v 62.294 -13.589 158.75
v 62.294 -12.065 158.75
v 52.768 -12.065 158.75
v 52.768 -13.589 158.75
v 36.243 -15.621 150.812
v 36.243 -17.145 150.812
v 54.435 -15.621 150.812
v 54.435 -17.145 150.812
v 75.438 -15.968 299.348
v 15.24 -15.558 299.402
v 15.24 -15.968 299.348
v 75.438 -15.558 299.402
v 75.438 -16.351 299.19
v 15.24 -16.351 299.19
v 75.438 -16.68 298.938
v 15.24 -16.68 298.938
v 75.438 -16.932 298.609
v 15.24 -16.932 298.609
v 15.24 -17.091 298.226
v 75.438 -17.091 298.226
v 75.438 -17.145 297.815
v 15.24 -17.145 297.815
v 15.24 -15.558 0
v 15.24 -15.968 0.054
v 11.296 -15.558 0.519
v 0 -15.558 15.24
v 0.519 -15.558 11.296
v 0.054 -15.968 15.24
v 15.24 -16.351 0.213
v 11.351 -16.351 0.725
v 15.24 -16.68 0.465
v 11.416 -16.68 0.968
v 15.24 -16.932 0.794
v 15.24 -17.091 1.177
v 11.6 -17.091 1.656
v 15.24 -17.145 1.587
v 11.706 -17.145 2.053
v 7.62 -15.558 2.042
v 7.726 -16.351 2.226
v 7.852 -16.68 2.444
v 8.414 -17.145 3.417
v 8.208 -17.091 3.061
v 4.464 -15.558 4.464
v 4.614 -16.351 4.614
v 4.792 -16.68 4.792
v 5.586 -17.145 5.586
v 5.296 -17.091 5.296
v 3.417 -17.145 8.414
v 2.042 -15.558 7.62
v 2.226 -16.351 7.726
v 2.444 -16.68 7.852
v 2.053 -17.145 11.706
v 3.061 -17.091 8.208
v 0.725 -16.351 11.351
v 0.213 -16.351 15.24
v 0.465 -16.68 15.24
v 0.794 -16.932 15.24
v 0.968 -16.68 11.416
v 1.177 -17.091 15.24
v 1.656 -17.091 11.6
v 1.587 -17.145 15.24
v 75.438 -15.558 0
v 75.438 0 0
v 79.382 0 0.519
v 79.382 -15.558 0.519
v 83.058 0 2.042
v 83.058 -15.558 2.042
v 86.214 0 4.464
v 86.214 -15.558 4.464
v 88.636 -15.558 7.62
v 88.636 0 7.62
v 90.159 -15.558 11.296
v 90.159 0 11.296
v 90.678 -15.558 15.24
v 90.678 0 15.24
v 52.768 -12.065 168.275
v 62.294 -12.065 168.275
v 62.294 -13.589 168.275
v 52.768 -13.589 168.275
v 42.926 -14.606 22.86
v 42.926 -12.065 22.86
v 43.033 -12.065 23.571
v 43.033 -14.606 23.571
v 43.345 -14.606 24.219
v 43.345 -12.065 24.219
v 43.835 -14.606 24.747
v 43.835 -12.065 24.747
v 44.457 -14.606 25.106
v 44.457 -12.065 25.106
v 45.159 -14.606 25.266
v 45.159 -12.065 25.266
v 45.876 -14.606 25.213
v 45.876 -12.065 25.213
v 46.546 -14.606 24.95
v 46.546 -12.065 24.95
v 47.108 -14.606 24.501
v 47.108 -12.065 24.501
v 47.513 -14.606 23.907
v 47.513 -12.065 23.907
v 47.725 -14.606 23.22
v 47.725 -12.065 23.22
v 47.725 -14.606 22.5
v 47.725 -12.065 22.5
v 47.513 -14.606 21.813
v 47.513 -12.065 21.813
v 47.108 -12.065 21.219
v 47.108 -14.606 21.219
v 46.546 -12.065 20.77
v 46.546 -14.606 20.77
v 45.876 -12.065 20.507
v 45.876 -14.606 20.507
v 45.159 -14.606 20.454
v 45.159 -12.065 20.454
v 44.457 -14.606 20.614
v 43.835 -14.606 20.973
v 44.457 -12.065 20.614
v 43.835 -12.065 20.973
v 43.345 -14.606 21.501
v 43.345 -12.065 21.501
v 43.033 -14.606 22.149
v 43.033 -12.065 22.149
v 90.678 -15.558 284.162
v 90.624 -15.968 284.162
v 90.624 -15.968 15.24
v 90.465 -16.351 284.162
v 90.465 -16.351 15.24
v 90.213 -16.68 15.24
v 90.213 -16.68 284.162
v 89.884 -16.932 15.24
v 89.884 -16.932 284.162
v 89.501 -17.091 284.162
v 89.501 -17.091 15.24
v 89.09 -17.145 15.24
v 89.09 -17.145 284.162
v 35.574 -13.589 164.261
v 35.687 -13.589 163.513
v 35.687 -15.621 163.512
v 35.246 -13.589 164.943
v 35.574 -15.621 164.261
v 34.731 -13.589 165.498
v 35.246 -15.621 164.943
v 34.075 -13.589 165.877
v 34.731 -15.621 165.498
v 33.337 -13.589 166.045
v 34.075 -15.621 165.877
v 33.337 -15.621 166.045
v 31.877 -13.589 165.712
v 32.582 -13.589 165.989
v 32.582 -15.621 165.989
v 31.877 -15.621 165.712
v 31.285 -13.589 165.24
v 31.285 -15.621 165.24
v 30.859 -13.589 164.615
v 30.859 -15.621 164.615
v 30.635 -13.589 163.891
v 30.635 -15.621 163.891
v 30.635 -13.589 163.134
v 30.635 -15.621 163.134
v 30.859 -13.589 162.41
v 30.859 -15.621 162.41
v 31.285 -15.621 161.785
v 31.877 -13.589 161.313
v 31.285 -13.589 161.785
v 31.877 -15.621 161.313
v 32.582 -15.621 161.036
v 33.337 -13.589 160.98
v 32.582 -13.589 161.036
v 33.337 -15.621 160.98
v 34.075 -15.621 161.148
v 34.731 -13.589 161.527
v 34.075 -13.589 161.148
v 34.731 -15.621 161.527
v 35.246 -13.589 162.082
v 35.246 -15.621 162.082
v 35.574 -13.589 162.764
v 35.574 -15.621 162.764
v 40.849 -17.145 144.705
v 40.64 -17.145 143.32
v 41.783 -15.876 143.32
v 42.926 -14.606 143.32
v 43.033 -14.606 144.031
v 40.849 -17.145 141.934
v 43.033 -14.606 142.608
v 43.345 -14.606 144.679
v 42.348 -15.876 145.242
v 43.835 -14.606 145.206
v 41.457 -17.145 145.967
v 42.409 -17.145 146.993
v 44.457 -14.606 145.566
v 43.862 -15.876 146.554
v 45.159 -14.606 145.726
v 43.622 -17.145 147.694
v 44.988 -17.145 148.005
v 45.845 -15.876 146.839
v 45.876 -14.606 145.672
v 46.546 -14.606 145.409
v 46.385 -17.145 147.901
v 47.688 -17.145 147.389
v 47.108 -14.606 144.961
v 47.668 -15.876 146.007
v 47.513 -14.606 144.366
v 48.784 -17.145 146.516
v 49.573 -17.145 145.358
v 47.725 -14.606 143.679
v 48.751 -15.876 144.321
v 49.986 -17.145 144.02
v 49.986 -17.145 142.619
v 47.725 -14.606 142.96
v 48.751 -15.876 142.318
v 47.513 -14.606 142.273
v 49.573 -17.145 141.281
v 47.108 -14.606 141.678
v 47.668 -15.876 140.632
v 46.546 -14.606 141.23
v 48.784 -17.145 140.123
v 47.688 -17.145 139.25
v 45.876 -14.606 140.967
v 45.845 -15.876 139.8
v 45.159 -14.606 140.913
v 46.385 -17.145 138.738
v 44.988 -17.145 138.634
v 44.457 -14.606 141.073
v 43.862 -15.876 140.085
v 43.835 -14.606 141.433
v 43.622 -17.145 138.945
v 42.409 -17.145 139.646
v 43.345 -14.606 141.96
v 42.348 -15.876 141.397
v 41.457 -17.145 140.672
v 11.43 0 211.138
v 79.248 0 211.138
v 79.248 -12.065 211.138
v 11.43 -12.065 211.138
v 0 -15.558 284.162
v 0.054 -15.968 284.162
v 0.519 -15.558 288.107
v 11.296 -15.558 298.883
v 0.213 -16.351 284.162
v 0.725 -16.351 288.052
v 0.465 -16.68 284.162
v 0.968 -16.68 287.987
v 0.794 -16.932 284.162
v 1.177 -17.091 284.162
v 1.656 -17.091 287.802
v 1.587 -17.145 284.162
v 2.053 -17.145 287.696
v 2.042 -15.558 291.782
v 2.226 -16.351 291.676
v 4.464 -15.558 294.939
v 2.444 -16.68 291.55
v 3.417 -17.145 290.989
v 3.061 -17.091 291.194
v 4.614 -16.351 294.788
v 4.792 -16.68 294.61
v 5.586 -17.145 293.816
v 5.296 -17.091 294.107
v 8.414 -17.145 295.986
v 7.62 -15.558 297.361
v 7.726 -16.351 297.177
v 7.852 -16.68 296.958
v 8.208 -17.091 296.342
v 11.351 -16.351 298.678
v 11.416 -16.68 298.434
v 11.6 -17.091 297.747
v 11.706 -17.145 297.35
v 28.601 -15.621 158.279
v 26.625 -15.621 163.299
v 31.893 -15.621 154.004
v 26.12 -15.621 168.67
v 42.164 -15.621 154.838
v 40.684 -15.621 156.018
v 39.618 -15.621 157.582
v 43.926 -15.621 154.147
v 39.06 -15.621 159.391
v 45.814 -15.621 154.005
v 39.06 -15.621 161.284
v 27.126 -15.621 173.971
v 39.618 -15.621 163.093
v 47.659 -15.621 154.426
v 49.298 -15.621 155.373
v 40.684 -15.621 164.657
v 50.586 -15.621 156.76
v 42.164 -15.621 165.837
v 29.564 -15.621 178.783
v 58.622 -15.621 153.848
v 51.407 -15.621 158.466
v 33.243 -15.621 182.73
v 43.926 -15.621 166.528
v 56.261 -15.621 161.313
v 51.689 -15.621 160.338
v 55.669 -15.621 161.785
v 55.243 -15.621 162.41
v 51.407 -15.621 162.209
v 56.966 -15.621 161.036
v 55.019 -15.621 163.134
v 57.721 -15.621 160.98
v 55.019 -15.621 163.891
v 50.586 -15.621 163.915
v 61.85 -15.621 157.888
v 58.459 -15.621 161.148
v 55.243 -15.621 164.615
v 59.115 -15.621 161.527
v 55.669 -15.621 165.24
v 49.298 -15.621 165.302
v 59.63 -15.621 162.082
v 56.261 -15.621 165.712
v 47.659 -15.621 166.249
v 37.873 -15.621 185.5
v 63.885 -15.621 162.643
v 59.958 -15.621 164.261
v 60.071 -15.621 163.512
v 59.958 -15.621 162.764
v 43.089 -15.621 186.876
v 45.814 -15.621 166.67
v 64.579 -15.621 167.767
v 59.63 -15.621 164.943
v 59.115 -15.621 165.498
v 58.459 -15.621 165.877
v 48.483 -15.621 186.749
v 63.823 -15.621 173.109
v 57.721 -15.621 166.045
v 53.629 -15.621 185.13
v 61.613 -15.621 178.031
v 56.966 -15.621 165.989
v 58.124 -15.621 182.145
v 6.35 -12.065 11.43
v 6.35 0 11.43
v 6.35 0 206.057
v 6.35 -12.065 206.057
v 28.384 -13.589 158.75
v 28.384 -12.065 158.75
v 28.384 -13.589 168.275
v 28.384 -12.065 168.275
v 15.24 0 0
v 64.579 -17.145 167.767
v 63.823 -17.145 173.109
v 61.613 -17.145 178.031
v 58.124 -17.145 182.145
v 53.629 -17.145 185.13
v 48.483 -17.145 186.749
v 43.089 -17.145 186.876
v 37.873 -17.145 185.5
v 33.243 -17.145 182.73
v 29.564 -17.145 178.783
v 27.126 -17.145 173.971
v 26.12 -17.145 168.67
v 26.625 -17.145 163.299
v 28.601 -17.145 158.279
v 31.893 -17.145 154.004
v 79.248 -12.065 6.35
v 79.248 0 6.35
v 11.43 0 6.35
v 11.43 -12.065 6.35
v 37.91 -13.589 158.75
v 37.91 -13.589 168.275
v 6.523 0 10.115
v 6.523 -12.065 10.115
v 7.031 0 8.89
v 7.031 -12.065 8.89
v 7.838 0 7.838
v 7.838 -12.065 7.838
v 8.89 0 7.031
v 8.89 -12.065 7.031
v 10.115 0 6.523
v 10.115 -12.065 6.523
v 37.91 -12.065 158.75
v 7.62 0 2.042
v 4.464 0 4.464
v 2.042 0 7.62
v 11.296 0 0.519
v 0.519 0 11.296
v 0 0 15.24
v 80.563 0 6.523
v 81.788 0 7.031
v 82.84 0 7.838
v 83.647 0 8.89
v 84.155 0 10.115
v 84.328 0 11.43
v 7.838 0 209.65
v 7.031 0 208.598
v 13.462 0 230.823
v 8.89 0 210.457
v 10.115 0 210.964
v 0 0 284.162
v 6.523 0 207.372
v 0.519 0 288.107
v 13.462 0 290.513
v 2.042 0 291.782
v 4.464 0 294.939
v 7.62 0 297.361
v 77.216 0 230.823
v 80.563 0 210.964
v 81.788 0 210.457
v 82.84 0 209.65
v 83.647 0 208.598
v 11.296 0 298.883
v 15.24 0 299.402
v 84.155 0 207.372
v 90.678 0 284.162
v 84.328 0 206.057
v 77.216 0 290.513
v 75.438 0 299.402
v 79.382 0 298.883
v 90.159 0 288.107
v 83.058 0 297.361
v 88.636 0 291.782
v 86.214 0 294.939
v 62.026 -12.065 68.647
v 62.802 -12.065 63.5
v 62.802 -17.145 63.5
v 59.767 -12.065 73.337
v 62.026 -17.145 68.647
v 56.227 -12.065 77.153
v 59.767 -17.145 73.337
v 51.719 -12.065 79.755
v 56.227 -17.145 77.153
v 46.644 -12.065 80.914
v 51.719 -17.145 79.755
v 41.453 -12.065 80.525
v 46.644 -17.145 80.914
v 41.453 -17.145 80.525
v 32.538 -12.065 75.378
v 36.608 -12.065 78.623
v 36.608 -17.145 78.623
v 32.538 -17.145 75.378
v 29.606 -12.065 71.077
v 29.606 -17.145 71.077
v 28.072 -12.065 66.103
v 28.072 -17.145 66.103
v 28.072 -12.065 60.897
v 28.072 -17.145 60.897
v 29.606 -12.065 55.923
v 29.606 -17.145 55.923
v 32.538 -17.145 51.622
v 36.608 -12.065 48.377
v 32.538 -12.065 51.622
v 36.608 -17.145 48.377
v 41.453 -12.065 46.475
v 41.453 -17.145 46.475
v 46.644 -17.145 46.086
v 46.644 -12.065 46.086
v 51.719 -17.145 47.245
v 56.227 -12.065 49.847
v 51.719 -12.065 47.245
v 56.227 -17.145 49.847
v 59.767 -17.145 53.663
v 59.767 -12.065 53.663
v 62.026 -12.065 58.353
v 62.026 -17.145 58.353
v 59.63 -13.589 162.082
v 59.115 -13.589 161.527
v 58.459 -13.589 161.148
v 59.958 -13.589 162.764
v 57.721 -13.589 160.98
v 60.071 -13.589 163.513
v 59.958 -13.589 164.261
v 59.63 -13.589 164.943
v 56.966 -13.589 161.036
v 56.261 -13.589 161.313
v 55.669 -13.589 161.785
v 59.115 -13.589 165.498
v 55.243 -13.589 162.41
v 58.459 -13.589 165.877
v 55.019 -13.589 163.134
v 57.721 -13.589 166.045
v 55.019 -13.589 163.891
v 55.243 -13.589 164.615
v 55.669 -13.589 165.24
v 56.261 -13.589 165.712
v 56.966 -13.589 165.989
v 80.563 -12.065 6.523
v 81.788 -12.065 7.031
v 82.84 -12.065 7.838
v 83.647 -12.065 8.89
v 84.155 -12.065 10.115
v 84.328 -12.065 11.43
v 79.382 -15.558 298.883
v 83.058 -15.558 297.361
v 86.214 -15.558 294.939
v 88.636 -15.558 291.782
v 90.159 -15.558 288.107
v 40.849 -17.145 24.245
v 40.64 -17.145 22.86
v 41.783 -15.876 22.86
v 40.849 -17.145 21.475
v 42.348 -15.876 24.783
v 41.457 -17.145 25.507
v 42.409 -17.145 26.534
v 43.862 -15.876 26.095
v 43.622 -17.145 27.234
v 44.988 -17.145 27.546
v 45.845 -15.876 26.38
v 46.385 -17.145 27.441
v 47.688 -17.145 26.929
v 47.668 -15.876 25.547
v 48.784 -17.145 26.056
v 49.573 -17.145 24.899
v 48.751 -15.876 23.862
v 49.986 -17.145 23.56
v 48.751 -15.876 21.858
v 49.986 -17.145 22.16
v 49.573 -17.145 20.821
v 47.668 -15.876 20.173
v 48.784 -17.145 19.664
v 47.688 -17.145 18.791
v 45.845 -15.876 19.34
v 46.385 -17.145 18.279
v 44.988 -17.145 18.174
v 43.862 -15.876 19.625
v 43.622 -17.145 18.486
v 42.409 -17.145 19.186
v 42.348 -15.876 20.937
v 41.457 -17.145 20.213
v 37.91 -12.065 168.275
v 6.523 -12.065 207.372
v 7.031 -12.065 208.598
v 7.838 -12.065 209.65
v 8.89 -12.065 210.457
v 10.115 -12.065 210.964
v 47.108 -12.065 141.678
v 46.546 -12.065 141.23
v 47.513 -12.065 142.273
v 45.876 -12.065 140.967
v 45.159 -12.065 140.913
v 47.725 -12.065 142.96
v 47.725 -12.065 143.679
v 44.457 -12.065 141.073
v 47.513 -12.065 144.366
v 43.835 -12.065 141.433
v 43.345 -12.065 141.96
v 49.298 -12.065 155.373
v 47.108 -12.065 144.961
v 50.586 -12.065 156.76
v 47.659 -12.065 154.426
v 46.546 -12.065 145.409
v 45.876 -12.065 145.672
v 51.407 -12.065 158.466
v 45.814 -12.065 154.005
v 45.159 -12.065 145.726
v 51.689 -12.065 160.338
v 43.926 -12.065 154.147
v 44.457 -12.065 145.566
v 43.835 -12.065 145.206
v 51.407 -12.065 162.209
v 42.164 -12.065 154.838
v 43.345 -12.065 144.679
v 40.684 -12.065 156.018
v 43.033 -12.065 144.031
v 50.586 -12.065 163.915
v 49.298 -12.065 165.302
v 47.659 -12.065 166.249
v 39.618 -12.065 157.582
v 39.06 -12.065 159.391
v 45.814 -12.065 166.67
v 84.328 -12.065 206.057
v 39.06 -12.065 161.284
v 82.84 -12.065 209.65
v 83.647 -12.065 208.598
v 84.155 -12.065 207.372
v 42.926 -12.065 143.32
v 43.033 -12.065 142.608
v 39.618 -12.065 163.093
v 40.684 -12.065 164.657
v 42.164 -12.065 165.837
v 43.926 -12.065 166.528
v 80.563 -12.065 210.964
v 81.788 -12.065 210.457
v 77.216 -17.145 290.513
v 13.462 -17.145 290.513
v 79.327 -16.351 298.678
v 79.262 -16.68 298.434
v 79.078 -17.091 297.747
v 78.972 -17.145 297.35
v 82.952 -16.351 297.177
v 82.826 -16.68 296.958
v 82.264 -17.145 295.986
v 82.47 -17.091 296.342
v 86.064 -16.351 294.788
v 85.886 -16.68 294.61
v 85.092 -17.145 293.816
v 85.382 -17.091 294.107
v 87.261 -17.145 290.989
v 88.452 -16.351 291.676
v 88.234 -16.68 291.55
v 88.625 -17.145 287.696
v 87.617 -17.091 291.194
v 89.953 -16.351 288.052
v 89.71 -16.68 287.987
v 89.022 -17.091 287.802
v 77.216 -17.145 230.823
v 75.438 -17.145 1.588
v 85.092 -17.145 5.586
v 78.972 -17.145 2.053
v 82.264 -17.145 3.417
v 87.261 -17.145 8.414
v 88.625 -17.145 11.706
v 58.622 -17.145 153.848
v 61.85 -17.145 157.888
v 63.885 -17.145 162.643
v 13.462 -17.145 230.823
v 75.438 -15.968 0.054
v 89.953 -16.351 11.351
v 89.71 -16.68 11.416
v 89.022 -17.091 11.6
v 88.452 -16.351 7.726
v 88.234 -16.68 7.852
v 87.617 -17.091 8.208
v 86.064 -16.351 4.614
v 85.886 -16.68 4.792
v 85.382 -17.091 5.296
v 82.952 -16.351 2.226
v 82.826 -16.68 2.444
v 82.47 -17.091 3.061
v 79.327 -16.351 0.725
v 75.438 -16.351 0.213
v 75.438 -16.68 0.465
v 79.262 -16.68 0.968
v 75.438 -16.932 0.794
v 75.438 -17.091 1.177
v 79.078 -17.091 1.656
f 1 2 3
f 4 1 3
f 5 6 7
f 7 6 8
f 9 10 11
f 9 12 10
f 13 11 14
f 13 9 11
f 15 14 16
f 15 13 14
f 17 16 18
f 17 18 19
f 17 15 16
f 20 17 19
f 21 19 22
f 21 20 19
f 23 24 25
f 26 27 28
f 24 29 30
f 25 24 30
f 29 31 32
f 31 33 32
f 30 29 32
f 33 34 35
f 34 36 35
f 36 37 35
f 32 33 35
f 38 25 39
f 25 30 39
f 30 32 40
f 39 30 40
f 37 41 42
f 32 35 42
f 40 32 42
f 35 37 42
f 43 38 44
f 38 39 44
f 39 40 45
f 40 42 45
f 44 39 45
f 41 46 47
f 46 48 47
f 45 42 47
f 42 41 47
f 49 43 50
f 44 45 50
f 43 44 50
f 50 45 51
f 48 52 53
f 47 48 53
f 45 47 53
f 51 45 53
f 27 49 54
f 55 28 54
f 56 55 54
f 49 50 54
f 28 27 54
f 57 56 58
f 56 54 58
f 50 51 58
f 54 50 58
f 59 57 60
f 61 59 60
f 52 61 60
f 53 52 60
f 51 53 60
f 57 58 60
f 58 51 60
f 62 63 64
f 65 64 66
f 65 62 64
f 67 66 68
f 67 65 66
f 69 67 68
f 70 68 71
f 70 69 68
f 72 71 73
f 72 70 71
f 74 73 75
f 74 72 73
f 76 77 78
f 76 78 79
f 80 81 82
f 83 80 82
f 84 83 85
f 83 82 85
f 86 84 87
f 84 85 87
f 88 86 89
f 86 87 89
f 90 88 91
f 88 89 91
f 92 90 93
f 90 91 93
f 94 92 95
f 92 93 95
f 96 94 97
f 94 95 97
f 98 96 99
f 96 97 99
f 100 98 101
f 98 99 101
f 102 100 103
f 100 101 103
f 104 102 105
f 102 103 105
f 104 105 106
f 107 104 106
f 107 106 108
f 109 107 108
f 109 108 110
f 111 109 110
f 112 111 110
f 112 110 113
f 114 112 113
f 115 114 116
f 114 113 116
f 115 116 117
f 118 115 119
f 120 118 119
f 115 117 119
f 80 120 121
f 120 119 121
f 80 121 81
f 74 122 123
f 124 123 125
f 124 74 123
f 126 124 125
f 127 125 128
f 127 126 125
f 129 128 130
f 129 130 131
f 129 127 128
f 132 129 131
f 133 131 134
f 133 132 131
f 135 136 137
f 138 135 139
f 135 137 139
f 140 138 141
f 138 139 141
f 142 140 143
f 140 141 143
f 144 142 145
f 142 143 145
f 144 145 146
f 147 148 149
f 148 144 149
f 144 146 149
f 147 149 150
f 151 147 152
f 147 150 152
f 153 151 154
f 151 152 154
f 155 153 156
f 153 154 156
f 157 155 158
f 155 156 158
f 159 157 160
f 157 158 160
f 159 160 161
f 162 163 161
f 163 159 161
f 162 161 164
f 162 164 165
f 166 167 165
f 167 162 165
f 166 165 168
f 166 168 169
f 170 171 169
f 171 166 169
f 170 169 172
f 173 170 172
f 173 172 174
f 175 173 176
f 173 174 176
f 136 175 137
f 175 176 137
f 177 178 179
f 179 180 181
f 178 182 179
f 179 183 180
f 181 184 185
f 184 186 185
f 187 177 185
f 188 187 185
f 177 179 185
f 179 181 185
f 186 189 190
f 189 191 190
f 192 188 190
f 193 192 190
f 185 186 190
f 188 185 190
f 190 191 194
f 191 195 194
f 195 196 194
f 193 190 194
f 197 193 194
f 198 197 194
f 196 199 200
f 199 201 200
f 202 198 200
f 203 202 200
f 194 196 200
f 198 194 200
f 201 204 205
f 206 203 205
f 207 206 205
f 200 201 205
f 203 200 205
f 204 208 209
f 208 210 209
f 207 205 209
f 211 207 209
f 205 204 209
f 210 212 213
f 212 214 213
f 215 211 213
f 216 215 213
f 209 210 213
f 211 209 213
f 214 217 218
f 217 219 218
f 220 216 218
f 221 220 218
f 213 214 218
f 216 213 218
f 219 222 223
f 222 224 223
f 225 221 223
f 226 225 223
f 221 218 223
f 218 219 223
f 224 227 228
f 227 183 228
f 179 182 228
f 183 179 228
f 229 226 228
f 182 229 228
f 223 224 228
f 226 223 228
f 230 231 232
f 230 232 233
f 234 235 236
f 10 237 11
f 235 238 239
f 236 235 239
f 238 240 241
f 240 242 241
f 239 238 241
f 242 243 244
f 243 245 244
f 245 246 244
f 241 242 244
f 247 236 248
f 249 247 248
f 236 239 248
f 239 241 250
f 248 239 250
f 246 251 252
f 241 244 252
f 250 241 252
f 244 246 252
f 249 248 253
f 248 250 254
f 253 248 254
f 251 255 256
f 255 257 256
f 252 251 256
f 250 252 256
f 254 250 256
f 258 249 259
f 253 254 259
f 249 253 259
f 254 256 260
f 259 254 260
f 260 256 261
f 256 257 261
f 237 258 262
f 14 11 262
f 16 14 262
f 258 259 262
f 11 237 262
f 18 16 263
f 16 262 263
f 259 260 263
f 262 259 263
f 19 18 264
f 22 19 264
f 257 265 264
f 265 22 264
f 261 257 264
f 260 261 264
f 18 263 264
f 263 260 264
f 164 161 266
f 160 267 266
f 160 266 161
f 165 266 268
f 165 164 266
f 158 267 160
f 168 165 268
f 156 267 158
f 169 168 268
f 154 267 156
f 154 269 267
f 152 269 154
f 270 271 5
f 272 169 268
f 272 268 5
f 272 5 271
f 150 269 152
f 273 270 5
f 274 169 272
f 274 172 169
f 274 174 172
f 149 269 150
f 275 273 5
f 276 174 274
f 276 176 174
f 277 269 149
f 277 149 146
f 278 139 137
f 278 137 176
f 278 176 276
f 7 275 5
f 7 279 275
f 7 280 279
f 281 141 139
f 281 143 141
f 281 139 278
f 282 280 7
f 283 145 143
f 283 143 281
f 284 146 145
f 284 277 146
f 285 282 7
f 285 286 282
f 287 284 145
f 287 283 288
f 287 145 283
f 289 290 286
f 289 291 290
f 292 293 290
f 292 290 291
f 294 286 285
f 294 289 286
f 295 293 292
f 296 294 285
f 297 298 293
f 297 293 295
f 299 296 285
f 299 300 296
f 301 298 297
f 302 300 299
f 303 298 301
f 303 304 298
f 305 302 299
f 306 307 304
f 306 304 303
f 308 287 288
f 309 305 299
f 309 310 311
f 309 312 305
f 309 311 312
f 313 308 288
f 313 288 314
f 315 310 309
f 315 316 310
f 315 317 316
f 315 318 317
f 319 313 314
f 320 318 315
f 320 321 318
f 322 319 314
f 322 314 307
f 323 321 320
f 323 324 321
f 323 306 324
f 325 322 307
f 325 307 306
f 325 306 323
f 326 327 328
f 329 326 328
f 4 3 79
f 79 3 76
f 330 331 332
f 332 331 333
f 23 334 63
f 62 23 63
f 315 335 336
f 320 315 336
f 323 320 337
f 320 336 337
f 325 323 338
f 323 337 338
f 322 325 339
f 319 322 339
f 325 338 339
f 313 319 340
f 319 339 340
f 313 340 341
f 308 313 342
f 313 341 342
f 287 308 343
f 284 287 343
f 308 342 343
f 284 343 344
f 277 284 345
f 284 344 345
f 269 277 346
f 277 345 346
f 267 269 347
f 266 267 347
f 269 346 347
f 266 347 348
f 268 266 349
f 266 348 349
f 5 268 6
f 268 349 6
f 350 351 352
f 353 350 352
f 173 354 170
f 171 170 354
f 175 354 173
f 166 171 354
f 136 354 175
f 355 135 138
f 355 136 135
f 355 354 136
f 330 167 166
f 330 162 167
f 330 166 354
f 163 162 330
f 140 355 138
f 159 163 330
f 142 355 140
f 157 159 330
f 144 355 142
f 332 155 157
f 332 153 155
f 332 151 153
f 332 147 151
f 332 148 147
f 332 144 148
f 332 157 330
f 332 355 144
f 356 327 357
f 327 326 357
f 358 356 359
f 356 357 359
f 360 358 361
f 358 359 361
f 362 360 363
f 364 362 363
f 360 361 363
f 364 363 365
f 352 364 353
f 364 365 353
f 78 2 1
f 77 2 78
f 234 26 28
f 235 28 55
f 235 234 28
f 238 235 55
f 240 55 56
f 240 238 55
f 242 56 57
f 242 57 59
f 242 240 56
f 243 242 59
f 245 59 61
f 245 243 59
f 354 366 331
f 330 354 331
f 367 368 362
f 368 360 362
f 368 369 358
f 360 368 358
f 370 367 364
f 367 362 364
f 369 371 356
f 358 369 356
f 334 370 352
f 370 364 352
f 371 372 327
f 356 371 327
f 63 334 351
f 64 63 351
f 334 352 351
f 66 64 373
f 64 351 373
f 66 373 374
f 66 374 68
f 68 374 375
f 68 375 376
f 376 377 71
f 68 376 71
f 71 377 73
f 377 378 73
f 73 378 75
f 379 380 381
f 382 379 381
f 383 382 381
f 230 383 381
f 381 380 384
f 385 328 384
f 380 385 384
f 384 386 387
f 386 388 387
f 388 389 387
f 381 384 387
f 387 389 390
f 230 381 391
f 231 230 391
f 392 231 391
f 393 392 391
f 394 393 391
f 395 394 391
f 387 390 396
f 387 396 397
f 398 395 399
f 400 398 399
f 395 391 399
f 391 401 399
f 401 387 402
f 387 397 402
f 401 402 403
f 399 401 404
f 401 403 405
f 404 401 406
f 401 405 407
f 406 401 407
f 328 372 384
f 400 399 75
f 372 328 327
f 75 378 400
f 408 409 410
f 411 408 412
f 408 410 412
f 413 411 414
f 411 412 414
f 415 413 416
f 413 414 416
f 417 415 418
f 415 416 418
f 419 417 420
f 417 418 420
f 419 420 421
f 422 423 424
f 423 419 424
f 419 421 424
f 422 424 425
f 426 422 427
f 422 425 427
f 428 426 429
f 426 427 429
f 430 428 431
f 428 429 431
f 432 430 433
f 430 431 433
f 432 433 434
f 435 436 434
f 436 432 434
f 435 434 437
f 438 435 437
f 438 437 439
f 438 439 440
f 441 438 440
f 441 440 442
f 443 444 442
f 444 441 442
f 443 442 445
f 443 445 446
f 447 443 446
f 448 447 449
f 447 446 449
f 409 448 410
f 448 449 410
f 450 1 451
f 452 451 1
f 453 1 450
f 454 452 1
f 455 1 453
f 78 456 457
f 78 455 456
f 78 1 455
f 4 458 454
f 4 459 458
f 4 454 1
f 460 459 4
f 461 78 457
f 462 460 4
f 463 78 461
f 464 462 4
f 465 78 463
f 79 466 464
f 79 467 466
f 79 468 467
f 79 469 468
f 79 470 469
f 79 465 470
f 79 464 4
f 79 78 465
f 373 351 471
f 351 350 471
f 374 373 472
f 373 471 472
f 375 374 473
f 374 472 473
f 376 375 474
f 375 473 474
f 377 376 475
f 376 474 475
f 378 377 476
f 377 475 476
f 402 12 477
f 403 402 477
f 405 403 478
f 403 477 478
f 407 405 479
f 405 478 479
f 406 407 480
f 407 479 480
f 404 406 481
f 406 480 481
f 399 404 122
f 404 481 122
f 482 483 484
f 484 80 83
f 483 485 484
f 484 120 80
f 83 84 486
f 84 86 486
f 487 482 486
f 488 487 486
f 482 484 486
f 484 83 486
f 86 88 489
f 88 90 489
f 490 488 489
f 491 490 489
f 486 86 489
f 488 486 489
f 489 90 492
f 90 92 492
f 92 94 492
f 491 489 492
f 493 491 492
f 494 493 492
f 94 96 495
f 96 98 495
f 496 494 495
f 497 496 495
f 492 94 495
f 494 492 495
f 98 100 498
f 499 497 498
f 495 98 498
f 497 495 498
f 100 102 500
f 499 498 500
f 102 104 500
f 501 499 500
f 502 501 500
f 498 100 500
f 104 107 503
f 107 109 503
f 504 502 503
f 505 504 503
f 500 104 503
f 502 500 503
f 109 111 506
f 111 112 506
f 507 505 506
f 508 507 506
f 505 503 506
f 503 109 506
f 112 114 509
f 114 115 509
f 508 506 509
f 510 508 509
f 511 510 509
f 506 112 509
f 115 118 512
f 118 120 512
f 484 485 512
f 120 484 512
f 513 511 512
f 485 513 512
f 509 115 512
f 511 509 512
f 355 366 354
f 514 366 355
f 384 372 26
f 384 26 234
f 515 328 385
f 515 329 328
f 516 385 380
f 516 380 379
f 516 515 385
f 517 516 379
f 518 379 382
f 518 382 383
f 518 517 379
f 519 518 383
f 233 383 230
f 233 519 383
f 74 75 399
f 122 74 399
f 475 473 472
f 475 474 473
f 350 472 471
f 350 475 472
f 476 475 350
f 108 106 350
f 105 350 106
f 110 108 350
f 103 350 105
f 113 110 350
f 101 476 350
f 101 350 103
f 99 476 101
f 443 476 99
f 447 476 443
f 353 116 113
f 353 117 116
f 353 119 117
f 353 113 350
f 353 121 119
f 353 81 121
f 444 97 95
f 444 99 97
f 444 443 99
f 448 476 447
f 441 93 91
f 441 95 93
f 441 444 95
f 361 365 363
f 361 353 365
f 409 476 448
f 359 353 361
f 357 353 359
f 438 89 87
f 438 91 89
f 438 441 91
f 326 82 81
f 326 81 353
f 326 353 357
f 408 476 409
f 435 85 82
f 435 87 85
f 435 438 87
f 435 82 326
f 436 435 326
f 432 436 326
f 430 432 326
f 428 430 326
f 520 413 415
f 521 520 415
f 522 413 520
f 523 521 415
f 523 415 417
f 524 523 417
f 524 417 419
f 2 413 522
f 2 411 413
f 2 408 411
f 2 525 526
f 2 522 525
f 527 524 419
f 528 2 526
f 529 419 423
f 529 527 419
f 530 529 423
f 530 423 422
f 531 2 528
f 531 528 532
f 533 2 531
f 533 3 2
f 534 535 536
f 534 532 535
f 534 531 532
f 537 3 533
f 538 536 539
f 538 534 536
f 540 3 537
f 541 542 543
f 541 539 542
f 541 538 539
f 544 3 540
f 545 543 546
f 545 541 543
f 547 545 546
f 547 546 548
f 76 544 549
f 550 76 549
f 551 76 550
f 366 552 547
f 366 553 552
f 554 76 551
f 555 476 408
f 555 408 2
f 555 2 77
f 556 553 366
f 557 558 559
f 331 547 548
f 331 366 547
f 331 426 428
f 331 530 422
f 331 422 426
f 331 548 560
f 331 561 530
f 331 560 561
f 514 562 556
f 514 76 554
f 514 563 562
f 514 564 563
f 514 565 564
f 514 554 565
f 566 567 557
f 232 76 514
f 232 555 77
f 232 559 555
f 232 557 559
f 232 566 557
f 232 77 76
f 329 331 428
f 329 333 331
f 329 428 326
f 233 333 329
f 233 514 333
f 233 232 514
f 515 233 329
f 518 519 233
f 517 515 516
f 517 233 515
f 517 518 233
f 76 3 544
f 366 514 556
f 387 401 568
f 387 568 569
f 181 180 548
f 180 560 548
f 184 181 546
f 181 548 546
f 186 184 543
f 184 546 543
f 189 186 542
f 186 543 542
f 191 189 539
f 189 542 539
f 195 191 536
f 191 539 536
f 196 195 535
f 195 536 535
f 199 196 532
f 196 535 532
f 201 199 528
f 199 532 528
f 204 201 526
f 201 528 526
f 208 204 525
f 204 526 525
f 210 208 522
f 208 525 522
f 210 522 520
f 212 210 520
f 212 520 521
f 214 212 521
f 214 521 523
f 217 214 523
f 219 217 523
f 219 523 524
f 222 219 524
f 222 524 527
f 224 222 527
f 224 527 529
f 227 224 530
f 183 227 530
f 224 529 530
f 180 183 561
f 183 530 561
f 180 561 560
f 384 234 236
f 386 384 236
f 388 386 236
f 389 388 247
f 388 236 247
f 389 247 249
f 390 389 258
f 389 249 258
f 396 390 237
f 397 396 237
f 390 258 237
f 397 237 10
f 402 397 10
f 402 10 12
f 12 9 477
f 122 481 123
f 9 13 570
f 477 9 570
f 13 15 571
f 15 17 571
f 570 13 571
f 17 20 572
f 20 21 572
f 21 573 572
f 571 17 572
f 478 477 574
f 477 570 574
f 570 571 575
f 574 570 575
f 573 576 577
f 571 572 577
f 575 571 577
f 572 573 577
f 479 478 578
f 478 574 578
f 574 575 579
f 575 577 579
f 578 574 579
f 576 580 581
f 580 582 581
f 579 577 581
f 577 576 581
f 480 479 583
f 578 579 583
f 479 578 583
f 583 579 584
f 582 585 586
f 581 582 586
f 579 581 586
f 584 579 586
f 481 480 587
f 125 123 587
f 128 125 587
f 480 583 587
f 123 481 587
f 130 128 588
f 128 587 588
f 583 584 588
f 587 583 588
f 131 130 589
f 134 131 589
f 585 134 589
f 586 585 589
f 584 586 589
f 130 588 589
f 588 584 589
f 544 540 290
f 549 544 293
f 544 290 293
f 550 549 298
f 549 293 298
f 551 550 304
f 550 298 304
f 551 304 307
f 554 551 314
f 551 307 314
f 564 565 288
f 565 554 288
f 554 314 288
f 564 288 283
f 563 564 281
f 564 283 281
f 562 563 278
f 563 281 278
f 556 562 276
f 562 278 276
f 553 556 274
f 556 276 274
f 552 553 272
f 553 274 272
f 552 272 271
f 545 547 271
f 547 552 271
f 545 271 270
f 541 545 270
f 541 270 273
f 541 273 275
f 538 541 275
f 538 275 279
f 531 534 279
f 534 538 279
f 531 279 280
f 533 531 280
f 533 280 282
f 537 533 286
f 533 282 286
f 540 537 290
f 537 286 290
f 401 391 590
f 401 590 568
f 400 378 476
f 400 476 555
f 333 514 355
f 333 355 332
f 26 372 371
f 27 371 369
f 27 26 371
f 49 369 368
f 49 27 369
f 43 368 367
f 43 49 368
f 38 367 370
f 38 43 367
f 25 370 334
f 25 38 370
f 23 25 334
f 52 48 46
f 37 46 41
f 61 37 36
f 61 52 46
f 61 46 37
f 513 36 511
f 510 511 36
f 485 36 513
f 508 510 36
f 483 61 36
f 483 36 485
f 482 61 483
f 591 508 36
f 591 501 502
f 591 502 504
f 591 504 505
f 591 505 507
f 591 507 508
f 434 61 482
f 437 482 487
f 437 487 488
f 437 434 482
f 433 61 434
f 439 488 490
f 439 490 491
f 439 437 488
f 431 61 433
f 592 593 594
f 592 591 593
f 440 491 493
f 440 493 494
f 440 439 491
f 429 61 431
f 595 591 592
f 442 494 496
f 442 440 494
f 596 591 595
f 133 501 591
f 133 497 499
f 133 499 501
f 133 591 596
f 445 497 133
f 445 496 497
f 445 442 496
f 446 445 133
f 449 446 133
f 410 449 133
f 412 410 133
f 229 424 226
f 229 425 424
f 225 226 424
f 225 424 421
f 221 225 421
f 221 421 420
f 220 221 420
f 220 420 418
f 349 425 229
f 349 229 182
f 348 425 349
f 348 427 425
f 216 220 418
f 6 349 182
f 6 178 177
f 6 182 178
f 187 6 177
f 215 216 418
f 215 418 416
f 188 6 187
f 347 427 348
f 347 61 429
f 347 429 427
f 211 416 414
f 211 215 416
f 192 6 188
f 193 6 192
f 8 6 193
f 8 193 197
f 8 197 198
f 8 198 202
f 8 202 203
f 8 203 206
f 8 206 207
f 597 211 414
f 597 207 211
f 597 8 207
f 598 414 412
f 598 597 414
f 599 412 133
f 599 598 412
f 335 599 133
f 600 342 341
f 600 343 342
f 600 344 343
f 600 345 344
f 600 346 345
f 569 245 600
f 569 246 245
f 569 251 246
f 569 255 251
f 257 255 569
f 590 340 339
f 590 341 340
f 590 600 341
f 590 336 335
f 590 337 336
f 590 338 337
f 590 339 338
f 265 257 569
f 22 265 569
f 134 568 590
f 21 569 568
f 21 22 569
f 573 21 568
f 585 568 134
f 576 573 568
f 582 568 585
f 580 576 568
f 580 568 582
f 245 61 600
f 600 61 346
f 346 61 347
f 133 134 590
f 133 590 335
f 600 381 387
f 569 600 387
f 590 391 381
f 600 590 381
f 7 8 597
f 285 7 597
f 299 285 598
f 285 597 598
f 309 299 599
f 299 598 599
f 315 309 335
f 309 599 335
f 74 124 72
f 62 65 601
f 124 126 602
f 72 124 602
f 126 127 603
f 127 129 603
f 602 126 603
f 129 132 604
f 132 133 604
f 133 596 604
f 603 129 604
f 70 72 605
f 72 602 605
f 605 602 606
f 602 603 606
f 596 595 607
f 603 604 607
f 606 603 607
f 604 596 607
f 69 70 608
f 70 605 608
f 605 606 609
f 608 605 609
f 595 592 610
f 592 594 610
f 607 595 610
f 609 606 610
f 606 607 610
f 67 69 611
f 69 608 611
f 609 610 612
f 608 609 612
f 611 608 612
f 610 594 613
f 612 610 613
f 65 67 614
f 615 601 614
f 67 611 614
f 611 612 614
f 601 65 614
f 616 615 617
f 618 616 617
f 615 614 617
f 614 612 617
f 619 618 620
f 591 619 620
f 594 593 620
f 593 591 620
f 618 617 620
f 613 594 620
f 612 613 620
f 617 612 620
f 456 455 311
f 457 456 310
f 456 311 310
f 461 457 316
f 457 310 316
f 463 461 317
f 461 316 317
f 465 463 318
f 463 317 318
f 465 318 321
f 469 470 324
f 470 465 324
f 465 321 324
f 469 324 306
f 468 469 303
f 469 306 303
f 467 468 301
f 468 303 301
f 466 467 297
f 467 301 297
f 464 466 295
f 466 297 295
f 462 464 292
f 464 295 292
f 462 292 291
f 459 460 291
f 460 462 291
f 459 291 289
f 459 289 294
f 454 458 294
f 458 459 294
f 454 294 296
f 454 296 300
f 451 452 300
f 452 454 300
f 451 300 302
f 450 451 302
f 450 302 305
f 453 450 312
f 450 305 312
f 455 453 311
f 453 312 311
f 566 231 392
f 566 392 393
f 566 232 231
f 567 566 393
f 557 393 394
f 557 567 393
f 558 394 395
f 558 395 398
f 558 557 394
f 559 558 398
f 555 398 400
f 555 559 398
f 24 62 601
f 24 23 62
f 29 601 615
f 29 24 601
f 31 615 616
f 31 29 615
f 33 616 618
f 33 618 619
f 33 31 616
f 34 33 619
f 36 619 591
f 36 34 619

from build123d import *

# Parameters (mm, degrees)
F0_W           = 90.678
F0_H           = 217.4875
F1_DEPTH       = 17.145
F3_D           = 4.826
F3_CSINK_D     = 9.398
F3_CSINK_ANGLE = 84
F2_R           = 17.4625
F2_R_2         = 6.35
F2_R_3         = 2.54
F4_DEPTH       = 25.4
F5_W           = 77.978
F5_H           = 204.7875
F5_R           = 2.413
F5_R_2         = 17.4625
F5_R_3         = 6.35
F5_R_4         = 2.54
F6_DEPTH       = 12.065
F7_D           = 4.826
F7_CSINK_D     = 9.398
F7_CSINK_ANGLE = 84
F8_W           = 90.678
F8_H           = 81.915
F9_DEPTH       = 17.145
F10_W          = 63.754
F10_H          = 59.69
F11_DEPTH      = 17.146
F12_DEPTH      = 1.524
F13_W          = 9.525
F13_H          = 9.525
F13_R          = 2.54
F14_DEPTH      = 1.524
F15_R          = 5.08
F16_R          = 15.24
F17_R          = 1.5875


with BuildPart() as f1:
    # F0 (on Front) → F1 (new body)
    with BuildSketch(Plane.XZ):
        with Locations((45.339, 108.74375)):
            Rectangle(F0_W, F0_H)
    extrude(amount=F1_DEPTH)

    # F3 (through all)
    with Locations(Plane.XZ.offset(17.145)):
        with Locations((45.339, 22.86)):
            CounterSinkHole(F3_D / 2, F3_CSINK_D / 2, counter_sink_angle=F3_CSINK_ANGLE)

    # F2 (on face) → F4 (cut)
    with BuildSketch(Plane.XZ.offset(17.145)):
        with Locations((45.339, 63.5)):
            Circle(F2_R)
        with Locations((45.339, 160.3375)):
            Circle(F2_R_2)
        with Locations((33.147, 163.5125)):
            Circle(F2_R_3)
        with Locations((57.531, 163.5125)):
            Circle(F2_R_3)
    extrude(amount=-F4_DEPTH, mode=Mode.SUBTRACT)

    # F5 (on face) → F6 (cut)
    with BuildSketch(Plane(origin=(0, 0, 0), x_dir=(-1, 0, 0), z_dir=(0, 1, 0))):
        with Locations((-45.339, 108.74375)):
            Rectangle(F5_W, F5_H)
        with Locations((-45.339, 22.86)):
            Circle(F5_R, mode=Mode.SUBTRACT)
        with Locations((-45.339, 63.5)):
            Circle(F5_R_2, mode=Mode.SUBTRACT)
        with Locations((-45.339, 160.3375)):
            Circle(F5_R_3, mode=Mode.SUBTRACT)
        with Locations((-57.531, 163.5125)):
            Circle(F5_R_4, mode=Mode.SUBTRACT)
        with Locations((-33.147, 163.5125)):
            Circle(F5_R_4, mode=Mode.SUBTRACT)
    extrude(amount=-F6_DEPTH, mode=Mode.SUBTRACT)

    # F7 (through all)
    with Locations(Plane.XZ.offset(17.145)):
        with Locations((45.339, 143.3195)):
            CounterSinkHole(F7_D / 2, F7_CSINK_D / 2, counter_sink_angle=F7_CSINK_ANGLE)

    # F8 (on Front) → F9 (join, through all)
    with BuildSketch(Plane.XZ):
        with Locations((45.339, 258.445)):
            Rectangle(F8_W, F8_H)
    extrude(amount=F9_DEPTH)

    # F10 (on face) → F11 (cut, through all)
    with BuildSketch(Plane(origin=(0, 0, 0), x_dir=(-1, 0, 0), z_dir=(0, 1, 0))):
        with Locations((-45.339, 260.6675)):
            Rectangle(F10_W, F10_H)
    extrude(amount=-F11_DEPTH, mode=Mode.SUBTRACT)

    # F2 (on face) → F12 (cut)
    with BuildSketch(Plane.XZ.offset(17.145)):
        with BuildLine():
            ThreePointArc((54.4352503264, 150.8125), (61.8498032005, 157.8882238651), (64.5795, 167.767))
            ThreePointArc((64.5795, 167.767), (35.4602238651, 184.2778032005), (36.2427496736, 150.8125))
            Line((36.2427496736, 150.8125), (54.4352503264, 150.8125))
        make_face()
        with Locations((45.339, 160.3375)):
            Circle(F2_R_2, mode=Mode.SUBTRACT)
        with Locations((33.147, 163.5125)):
            Circle(F2_R_3, mode=Mode.SUBTRACT)
        with Locations((57.531, 163.5125)):
            Circle(F2_R_3, mode=Mode.SUBTRACT)
    extrude(amount=-F12_DEPTH, mode=Mode.SUBTRACT)

    # F13 (on face) → F14 (cut)
    with BuildSketch(Plane(origin=(0, -12.065, 0), x_dir=(-1, 0, 0), z_dir=(0, 1, 0))):
        with Locations((-57.531, 163.5125)):
            Rectangle(F13_W, F13_H)
        with Locations((-57.531, 163.5125)):
            Circle(F13_R, mode=Mode.SUBTRACT)
        with Locations((-33.147, 163.5125)):
            Rectangle(F13_W, F13_H)
        with Locations((-33.147, 163.5125)):
            Circle(F13_R, mode=Mode.SUBTRACT)
    extrude(amount=-F14_DEPTH, mode=Mode.SUBTRACT)

    # F15
    f15_edges = [f1.edges().sort_by_distance(p)[0] for p in [
        (84.328, -6.0325, 211.1375),
        (6.35, -6.0325, 211.1375),
        (6.35, -6.0325, 6.35),
        (84.328, -6.0325, 6.35),
    ]]
    fillet(f15_edges, radius=F15_R)

    # F16
    f16_edges = [f1.edges().sort_by_distance(p)[0] for p in [
        (90.678, -8.5725, 0),
        (0, -8.5725, 0),
        (0, -8.5725, 299.4025),
        (90.678, -8.5725, 299.4025),
    ]]
    fillet(f16_edges, radius=F16_R)

    # F17
    f17_edges = [f1.edges().sort_by_distance(p)[0] for p in [
        (0, -17.145, 149.70125),
        (45.339, -17.145, 0),
        (4.463693, -17.145, 4.463693),
        (86.214307, -17.145, 4.463693),
        (90.678, -17.145, 149.70125),
        (4.463693, -17.145, 294.938807),
        (86.214307, -17.145, 294.938807),
        (45.339, -17.145, 299.4025),
    ]]
    fillet(f17_edges, radius=F17_R)


solid = f1.part
